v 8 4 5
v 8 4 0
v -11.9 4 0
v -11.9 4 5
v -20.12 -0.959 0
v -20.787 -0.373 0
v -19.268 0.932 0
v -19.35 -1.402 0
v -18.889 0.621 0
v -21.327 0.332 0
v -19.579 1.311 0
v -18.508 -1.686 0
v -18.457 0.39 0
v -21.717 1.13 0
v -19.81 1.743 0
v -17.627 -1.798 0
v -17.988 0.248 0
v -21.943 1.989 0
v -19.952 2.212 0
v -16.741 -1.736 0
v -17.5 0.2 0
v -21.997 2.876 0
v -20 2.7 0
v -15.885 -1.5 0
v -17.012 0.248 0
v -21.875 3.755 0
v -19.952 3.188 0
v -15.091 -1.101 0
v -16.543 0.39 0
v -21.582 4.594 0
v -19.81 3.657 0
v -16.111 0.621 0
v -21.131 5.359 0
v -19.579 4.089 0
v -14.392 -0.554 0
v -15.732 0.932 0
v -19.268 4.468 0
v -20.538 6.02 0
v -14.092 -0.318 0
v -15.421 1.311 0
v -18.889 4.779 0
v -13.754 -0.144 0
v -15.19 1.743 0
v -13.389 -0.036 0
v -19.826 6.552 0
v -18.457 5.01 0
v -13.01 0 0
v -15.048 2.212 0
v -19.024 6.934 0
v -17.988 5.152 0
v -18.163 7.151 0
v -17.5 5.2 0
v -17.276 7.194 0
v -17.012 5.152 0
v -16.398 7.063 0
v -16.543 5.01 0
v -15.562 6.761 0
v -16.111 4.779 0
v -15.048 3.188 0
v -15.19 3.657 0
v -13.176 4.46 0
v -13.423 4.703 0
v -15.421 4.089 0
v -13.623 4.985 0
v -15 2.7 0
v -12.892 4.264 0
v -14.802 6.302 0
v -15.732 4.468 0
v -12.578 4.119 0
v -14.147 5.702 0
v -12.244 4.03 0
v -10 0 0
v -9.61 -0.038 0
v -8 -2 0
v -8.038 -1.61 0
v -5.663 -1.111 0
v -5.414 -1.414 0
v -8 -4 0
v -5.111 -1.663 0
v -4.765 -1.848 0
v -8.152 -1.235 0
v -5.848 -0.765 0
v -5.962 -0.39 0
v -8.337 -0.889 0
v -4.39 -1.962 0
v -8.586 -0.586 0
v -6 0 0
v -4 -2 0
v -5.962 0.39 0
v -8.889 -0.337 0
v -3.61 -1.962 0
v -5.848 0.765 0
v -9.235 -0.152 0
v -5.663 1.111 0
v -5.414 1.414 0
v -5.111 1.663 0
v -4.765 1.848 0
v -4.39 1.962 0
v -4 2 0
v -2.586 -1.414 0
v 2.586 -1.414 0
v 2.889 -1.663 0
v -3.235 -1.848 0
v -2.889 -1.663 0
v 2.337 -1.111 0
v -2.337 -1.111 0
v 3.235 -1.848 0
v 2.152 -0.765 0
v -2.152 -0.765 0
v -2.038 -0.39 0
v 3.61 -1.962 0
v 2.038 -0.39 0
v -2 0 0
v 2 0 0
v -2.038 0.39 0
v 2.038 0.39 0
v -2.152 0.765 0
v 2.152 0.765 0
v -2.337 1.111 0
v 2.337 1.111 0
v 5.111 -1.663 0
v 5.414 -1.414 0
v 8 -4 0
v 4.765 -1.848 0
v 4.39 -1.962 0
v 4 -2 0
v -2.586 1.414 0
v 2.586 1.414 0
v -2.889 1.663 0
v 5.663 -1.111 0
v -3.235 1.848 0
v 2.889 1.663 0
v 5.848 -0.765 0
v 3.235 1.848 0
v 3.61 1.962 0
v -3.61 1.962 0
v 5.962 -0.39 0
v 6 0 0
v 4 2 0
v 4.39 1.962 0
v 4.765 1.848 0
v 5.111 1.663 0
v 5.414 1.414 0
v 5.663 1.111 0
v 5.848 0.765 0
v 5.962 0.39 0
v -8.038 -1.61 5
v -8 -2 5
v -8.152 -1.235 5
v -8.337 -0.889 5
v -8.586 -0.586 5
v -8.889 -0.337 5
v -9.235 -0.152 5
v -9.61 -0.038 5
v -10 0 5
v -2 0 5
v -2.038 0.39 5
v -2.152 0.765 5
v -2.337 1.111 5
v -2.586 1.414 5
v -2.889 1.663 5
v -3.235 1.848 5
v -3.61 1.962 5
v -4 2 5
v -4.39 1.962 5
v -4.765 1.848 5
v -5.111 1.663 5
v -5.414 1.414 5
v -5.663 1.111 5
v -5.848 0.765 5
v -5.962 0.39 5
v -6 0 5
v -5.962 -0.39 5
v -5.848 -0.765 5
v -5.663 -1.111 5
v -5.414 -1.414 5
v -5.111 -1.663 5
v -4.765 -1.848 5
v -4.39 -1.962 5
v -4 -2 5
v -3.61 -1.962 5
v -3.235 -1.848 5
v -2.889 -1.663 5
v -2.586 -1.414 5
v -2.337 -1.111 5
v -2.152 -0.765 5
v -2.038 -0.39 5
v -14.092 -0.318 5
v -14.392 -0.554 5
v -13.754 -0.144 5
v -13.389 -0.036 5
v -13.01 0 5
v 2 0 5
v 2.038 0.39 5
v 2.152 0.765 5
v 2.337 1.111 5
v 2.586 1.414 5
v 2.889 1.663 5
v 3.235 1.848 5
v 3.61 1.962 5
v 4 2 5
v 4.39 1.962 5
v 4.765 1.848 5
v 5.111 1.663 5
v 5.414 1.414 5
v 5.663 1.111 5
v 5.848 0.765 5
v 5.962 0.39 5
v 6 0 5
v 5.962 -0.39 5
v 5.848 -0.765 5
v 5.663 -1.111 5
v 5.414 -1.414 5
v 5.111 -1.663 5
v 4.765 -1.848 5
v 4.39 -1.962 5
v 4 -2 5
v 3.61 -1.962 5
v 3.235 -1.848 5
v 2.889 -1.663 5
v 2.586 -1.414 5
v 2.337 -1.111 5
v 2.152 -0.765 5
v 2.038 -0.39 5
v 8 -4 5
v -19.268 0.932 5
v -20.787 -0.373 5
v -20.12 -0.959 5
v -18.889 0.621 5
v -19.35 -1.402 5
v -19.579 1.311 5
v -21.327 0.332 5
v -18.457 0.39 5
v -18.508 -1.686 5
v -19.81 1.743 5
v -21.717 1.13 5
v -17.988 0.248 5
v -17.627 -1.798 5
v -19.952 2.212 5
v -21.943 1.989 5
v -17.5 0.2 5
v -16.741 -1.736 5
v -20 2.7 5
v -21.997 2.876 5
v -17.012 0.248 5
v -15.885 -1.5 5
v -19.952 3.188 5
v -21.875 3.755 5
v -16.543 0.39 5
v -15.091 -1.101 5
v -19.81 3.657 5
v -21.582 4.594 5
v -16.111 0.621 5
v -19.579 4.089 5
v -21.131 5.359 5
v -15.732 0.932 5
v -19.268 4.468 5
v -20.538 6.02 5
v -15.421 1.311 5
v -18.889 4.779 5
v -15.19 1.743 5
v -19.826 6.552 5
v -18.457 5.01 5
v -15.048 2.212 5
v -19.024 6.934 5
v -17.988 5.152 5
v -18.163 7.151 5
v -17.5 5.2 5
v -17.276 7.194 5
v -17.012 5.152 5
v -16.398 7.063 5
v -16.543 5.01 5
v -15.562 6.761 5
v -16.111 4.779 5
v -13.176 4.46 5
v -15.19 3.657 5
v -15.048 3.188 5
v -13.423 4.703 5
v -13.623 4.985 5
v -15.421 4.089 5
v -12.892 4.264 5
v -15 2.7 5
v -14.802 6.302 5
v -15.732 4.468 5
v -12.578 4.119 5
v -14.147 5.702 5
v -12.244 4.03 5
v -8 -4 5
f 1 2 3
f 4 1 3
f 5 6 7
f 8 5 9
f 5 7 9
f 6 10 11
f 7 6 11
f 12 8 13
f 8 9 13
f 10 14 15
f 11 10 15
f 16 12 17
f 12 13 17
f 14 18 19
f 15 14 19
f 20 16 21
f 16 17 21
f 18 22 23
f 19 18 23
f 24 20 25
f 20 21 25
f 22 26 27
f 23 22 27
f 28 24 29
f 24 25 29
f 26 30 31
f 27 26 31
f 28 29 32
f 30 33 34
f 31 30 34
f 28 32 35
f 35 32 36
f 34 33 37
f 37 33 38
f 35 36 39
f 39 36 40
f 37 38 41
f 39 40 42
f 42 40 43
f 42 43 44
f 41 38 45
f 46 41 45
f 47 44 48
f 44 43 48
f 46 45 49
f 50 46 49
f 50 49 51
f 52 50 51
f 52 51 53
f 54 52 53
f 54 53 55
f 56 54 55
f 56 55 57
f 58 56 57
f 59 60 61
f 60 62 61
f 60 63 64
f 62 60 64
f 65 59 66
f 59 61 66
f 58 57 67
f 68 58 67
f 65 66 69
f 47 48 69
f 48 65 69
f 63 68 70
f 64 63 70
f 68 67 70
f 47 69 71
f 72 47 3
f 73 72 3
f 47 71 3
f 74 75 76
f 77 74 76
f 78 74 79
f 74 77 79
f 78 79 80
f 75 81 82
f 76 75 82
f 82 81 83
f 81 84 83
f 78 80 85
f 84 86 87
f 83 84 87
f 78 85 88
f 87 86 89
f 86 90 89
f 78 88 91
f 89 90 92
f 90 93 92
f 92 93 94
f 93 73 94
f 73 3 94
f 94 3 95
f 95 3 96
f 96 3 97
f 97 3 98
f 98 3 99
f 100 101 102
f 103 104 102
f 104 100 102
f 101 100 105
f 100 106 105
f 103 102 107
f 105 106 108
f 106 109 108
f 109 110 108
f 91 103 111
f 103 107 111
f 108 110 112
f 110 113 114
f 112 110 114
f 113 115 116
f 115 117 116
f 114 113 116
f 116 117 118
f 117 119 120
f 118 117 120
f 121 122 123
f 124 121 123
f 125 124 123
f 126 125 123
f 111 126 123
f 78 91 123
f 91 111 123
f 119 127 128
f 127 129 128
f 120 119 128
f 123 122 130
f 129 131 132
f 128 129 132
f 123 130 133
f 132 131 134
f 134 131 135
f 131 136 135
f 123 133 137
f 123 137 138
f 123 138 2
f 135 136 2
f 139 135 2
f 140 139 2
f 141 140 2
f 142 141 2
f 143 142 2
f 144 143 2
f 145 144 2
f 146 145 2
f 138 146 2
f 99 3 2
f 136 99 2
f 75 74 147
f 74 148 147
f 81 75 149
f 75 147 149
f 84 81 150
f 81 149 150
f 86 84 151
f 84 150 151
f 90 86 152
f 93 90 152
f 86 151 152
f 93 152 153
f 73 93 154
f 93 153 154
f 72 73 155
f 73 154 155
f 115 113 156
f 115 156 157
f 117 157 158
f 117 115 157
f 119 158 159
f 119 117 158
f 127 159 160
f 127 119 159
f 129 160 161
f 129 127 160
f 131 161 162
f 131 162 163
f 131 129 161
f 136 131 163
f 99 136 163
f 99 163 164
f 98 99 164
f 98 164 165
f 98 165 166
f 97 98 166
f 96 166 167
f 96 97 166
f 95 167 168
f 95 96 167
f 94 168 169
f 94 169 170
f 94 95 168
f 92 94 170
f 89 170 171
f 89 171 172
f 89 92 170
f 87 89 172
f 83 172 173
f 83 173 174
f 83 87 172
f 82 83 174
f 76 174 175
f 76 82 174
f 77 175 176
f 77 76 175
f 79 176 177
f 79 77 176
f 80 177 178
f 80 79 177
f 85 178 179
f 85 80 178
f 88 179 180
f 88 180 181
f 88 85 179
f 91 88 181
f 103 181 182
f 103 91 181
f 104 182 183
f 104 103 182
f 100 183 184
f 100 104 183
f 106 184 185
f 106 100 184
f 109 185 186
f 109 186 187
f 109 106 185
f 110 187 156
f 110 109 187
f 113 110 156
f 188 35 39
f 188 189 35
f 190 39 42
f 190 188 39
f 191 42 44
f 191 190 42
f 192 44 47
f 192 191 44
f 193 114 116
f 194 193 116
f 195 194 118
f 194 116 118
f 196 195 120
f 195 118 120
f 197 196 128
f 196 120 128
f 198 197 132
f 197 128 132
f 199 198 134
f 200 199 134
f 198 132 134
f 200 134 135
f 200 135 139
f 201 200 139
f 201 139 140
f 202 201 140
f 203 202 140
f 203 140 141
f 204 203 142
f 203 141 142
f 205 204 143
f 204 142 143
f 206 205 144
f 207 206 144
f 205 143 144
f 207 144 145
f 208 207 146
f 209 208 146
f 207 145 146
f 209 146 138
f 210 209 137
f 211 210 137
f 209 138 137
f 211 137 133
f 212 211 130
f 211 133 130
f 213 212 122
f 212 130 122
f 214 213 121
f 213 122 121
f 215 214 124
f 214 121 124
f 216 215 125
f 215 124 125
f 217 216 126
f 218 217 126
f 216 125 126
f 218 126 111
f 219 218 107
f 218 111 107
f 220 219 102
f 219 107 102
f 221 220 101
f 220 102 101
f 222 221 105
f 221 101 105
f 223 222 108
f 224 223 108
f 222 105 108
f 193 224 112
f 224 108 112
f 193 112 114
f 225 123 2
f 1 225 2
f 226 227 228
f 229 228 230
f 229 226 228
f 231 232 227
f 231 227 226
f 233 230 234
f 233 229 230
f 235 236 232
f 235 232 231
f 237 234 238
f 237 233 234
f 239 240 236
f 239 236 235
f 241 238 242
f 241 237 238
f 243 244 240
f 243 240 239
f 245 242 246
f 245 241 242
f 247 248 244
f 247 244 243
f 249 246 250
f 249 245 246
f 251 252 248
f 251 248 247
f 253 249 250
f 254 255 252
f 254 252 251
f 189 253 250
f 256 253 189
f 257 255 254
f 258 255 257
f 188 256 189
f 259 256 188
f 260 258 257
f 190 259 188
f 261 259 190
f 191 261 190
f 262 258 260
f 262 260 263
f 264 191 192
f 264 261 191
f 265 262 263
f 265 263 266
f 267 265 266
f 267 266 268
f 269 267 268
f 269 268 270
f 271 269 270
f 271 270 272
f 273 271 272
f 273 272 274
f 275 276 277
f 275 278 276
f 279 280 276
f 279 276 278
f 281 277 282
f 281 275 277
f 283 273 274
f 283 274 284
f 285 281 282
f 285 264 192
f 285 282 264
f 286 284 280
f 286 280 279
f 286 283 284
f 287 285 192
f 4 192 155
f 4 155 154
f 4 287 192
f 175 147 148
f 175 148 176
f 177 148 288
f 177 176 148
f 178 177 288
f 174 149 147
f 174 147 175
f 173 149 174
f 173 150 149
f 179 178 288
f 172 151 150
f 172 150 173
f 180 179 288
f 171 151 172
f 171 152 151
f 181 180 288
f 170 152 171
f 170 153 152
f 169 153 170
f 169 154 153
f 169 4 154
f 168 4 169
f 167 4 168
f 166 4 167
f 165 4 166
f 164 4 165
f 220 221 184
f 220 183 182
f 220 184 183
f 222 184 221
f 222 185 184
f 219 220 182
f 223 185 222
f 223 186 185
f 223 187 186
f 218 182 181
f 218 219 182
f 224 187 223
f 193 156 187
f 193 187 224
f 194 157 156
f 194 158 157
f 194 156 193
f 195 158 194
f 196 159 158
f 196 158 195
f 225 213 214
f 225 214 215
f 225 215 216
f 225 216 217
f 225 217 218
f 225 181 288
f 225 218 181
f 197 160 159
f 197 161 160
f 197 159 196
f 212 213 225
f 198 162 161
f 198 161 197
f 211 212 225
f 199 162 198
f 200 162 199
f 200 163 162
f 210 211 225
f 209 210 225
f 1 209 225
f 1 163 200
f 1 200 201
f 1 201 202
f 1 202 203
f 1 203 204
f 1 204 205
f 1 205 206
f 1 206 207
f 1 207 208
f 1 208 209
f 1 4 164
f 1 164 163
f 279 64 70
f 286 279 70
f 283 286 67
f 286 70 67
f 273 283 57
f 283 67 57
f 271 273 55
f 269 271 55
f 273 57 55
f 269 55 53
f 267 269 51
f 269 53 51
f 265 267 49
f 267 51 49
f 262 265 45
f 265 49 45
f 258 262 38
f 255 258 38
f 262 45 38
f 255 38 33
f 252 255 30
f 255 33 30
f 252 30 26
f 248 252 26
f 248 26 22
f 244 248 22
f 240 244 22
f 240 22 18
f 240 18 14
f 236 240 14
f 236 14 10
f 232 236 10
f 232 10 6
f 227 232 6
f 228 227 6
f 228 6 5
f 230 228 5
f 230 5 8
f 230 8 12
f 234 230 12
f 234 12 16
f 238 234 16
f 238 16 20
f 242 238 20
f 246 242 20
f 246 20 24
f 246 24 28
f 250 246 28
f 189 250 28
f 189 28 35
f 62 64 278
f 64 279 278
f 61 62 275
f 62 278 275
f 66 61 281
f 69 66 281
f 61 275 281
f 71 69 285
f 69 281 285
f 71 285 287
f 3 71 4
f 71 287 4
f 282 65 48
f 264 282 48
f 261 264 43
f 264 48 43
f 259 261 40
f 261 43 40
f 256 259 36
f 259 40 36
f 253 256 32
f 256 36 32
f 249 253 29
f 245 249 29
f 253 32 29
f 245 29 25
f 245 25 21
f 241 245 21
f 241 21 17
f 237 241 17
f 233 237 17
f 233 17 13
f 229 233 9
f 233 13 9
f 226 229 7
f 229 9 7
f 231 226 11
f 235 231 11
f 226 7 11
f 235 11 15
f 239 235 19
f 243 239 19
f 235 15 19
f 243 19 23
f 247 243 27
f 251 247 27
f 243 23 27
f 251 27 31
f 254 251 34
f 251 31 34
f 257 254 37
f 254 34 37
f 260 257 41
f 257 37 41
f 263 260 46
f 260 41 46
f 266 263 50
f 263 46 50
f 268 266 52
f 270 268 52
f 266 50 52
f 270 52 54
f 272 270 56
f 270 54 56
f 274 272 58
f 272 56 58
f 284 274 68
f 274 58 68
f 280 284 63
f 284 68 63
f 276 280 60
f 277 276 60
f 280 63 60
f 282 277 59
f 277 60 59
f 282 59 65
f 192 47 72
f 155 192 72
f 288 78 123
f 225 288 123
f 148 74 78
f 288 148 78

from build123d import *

# Parameters (mm, degrees)
SKETCH1_R           = 2
BOSS_EXTRUDE1_DEPTH = 5
FILLET1_R           = 2


with BuildPart() as part:
    # Sketch1 → Boss-Extrude1 (new body)
    with BuildSketch(Plane.XY):
        with BuildLine():
            Line((8, 4), (-13.191868154, 4))
            ThreePointArc((-13.191868154, 4), (-21.931098884, 3.484450558), (-13.9, 0))
            Line((-13.9, 0), (-8, 0))
            Line((-8, 0), (-8, -4))
            Line((-8, -4), (8, -4))
            Line((8, -4), (8, 4))
        make_face()
        with Locations((-4, 0)):
            Circle(SKETCH1_R, mode=Mode.SUBTRACT)
        with Locations((4, 0)):
            Circle(SKETCH1_R, mode=Mode.SUBTRACT)
        with BuildLine():
            ThreePointArc((-20, 2.7), (-17.5, 5.2), (-15, 2.7))
            ThreePointArc((-15, 2.7), (-17.5, 0.2), (-20, 2.7))
        make_face(mode=Mode.SUBTRACT)
    extrude(amount=BOSS_EXTRUDE1_DEPTH)

    # Fillet1
    fillet1_edges = [part.edges().sort_by_distance(p)[0] for p in [
        (-13.9, 0, 2.5),
        (-8, 0, 2.5),
        (-13.191868154, 4, 2.5),
    ]]
    fillet(fillet1_edges, radius=FILLET1_R)


solid = part.part
